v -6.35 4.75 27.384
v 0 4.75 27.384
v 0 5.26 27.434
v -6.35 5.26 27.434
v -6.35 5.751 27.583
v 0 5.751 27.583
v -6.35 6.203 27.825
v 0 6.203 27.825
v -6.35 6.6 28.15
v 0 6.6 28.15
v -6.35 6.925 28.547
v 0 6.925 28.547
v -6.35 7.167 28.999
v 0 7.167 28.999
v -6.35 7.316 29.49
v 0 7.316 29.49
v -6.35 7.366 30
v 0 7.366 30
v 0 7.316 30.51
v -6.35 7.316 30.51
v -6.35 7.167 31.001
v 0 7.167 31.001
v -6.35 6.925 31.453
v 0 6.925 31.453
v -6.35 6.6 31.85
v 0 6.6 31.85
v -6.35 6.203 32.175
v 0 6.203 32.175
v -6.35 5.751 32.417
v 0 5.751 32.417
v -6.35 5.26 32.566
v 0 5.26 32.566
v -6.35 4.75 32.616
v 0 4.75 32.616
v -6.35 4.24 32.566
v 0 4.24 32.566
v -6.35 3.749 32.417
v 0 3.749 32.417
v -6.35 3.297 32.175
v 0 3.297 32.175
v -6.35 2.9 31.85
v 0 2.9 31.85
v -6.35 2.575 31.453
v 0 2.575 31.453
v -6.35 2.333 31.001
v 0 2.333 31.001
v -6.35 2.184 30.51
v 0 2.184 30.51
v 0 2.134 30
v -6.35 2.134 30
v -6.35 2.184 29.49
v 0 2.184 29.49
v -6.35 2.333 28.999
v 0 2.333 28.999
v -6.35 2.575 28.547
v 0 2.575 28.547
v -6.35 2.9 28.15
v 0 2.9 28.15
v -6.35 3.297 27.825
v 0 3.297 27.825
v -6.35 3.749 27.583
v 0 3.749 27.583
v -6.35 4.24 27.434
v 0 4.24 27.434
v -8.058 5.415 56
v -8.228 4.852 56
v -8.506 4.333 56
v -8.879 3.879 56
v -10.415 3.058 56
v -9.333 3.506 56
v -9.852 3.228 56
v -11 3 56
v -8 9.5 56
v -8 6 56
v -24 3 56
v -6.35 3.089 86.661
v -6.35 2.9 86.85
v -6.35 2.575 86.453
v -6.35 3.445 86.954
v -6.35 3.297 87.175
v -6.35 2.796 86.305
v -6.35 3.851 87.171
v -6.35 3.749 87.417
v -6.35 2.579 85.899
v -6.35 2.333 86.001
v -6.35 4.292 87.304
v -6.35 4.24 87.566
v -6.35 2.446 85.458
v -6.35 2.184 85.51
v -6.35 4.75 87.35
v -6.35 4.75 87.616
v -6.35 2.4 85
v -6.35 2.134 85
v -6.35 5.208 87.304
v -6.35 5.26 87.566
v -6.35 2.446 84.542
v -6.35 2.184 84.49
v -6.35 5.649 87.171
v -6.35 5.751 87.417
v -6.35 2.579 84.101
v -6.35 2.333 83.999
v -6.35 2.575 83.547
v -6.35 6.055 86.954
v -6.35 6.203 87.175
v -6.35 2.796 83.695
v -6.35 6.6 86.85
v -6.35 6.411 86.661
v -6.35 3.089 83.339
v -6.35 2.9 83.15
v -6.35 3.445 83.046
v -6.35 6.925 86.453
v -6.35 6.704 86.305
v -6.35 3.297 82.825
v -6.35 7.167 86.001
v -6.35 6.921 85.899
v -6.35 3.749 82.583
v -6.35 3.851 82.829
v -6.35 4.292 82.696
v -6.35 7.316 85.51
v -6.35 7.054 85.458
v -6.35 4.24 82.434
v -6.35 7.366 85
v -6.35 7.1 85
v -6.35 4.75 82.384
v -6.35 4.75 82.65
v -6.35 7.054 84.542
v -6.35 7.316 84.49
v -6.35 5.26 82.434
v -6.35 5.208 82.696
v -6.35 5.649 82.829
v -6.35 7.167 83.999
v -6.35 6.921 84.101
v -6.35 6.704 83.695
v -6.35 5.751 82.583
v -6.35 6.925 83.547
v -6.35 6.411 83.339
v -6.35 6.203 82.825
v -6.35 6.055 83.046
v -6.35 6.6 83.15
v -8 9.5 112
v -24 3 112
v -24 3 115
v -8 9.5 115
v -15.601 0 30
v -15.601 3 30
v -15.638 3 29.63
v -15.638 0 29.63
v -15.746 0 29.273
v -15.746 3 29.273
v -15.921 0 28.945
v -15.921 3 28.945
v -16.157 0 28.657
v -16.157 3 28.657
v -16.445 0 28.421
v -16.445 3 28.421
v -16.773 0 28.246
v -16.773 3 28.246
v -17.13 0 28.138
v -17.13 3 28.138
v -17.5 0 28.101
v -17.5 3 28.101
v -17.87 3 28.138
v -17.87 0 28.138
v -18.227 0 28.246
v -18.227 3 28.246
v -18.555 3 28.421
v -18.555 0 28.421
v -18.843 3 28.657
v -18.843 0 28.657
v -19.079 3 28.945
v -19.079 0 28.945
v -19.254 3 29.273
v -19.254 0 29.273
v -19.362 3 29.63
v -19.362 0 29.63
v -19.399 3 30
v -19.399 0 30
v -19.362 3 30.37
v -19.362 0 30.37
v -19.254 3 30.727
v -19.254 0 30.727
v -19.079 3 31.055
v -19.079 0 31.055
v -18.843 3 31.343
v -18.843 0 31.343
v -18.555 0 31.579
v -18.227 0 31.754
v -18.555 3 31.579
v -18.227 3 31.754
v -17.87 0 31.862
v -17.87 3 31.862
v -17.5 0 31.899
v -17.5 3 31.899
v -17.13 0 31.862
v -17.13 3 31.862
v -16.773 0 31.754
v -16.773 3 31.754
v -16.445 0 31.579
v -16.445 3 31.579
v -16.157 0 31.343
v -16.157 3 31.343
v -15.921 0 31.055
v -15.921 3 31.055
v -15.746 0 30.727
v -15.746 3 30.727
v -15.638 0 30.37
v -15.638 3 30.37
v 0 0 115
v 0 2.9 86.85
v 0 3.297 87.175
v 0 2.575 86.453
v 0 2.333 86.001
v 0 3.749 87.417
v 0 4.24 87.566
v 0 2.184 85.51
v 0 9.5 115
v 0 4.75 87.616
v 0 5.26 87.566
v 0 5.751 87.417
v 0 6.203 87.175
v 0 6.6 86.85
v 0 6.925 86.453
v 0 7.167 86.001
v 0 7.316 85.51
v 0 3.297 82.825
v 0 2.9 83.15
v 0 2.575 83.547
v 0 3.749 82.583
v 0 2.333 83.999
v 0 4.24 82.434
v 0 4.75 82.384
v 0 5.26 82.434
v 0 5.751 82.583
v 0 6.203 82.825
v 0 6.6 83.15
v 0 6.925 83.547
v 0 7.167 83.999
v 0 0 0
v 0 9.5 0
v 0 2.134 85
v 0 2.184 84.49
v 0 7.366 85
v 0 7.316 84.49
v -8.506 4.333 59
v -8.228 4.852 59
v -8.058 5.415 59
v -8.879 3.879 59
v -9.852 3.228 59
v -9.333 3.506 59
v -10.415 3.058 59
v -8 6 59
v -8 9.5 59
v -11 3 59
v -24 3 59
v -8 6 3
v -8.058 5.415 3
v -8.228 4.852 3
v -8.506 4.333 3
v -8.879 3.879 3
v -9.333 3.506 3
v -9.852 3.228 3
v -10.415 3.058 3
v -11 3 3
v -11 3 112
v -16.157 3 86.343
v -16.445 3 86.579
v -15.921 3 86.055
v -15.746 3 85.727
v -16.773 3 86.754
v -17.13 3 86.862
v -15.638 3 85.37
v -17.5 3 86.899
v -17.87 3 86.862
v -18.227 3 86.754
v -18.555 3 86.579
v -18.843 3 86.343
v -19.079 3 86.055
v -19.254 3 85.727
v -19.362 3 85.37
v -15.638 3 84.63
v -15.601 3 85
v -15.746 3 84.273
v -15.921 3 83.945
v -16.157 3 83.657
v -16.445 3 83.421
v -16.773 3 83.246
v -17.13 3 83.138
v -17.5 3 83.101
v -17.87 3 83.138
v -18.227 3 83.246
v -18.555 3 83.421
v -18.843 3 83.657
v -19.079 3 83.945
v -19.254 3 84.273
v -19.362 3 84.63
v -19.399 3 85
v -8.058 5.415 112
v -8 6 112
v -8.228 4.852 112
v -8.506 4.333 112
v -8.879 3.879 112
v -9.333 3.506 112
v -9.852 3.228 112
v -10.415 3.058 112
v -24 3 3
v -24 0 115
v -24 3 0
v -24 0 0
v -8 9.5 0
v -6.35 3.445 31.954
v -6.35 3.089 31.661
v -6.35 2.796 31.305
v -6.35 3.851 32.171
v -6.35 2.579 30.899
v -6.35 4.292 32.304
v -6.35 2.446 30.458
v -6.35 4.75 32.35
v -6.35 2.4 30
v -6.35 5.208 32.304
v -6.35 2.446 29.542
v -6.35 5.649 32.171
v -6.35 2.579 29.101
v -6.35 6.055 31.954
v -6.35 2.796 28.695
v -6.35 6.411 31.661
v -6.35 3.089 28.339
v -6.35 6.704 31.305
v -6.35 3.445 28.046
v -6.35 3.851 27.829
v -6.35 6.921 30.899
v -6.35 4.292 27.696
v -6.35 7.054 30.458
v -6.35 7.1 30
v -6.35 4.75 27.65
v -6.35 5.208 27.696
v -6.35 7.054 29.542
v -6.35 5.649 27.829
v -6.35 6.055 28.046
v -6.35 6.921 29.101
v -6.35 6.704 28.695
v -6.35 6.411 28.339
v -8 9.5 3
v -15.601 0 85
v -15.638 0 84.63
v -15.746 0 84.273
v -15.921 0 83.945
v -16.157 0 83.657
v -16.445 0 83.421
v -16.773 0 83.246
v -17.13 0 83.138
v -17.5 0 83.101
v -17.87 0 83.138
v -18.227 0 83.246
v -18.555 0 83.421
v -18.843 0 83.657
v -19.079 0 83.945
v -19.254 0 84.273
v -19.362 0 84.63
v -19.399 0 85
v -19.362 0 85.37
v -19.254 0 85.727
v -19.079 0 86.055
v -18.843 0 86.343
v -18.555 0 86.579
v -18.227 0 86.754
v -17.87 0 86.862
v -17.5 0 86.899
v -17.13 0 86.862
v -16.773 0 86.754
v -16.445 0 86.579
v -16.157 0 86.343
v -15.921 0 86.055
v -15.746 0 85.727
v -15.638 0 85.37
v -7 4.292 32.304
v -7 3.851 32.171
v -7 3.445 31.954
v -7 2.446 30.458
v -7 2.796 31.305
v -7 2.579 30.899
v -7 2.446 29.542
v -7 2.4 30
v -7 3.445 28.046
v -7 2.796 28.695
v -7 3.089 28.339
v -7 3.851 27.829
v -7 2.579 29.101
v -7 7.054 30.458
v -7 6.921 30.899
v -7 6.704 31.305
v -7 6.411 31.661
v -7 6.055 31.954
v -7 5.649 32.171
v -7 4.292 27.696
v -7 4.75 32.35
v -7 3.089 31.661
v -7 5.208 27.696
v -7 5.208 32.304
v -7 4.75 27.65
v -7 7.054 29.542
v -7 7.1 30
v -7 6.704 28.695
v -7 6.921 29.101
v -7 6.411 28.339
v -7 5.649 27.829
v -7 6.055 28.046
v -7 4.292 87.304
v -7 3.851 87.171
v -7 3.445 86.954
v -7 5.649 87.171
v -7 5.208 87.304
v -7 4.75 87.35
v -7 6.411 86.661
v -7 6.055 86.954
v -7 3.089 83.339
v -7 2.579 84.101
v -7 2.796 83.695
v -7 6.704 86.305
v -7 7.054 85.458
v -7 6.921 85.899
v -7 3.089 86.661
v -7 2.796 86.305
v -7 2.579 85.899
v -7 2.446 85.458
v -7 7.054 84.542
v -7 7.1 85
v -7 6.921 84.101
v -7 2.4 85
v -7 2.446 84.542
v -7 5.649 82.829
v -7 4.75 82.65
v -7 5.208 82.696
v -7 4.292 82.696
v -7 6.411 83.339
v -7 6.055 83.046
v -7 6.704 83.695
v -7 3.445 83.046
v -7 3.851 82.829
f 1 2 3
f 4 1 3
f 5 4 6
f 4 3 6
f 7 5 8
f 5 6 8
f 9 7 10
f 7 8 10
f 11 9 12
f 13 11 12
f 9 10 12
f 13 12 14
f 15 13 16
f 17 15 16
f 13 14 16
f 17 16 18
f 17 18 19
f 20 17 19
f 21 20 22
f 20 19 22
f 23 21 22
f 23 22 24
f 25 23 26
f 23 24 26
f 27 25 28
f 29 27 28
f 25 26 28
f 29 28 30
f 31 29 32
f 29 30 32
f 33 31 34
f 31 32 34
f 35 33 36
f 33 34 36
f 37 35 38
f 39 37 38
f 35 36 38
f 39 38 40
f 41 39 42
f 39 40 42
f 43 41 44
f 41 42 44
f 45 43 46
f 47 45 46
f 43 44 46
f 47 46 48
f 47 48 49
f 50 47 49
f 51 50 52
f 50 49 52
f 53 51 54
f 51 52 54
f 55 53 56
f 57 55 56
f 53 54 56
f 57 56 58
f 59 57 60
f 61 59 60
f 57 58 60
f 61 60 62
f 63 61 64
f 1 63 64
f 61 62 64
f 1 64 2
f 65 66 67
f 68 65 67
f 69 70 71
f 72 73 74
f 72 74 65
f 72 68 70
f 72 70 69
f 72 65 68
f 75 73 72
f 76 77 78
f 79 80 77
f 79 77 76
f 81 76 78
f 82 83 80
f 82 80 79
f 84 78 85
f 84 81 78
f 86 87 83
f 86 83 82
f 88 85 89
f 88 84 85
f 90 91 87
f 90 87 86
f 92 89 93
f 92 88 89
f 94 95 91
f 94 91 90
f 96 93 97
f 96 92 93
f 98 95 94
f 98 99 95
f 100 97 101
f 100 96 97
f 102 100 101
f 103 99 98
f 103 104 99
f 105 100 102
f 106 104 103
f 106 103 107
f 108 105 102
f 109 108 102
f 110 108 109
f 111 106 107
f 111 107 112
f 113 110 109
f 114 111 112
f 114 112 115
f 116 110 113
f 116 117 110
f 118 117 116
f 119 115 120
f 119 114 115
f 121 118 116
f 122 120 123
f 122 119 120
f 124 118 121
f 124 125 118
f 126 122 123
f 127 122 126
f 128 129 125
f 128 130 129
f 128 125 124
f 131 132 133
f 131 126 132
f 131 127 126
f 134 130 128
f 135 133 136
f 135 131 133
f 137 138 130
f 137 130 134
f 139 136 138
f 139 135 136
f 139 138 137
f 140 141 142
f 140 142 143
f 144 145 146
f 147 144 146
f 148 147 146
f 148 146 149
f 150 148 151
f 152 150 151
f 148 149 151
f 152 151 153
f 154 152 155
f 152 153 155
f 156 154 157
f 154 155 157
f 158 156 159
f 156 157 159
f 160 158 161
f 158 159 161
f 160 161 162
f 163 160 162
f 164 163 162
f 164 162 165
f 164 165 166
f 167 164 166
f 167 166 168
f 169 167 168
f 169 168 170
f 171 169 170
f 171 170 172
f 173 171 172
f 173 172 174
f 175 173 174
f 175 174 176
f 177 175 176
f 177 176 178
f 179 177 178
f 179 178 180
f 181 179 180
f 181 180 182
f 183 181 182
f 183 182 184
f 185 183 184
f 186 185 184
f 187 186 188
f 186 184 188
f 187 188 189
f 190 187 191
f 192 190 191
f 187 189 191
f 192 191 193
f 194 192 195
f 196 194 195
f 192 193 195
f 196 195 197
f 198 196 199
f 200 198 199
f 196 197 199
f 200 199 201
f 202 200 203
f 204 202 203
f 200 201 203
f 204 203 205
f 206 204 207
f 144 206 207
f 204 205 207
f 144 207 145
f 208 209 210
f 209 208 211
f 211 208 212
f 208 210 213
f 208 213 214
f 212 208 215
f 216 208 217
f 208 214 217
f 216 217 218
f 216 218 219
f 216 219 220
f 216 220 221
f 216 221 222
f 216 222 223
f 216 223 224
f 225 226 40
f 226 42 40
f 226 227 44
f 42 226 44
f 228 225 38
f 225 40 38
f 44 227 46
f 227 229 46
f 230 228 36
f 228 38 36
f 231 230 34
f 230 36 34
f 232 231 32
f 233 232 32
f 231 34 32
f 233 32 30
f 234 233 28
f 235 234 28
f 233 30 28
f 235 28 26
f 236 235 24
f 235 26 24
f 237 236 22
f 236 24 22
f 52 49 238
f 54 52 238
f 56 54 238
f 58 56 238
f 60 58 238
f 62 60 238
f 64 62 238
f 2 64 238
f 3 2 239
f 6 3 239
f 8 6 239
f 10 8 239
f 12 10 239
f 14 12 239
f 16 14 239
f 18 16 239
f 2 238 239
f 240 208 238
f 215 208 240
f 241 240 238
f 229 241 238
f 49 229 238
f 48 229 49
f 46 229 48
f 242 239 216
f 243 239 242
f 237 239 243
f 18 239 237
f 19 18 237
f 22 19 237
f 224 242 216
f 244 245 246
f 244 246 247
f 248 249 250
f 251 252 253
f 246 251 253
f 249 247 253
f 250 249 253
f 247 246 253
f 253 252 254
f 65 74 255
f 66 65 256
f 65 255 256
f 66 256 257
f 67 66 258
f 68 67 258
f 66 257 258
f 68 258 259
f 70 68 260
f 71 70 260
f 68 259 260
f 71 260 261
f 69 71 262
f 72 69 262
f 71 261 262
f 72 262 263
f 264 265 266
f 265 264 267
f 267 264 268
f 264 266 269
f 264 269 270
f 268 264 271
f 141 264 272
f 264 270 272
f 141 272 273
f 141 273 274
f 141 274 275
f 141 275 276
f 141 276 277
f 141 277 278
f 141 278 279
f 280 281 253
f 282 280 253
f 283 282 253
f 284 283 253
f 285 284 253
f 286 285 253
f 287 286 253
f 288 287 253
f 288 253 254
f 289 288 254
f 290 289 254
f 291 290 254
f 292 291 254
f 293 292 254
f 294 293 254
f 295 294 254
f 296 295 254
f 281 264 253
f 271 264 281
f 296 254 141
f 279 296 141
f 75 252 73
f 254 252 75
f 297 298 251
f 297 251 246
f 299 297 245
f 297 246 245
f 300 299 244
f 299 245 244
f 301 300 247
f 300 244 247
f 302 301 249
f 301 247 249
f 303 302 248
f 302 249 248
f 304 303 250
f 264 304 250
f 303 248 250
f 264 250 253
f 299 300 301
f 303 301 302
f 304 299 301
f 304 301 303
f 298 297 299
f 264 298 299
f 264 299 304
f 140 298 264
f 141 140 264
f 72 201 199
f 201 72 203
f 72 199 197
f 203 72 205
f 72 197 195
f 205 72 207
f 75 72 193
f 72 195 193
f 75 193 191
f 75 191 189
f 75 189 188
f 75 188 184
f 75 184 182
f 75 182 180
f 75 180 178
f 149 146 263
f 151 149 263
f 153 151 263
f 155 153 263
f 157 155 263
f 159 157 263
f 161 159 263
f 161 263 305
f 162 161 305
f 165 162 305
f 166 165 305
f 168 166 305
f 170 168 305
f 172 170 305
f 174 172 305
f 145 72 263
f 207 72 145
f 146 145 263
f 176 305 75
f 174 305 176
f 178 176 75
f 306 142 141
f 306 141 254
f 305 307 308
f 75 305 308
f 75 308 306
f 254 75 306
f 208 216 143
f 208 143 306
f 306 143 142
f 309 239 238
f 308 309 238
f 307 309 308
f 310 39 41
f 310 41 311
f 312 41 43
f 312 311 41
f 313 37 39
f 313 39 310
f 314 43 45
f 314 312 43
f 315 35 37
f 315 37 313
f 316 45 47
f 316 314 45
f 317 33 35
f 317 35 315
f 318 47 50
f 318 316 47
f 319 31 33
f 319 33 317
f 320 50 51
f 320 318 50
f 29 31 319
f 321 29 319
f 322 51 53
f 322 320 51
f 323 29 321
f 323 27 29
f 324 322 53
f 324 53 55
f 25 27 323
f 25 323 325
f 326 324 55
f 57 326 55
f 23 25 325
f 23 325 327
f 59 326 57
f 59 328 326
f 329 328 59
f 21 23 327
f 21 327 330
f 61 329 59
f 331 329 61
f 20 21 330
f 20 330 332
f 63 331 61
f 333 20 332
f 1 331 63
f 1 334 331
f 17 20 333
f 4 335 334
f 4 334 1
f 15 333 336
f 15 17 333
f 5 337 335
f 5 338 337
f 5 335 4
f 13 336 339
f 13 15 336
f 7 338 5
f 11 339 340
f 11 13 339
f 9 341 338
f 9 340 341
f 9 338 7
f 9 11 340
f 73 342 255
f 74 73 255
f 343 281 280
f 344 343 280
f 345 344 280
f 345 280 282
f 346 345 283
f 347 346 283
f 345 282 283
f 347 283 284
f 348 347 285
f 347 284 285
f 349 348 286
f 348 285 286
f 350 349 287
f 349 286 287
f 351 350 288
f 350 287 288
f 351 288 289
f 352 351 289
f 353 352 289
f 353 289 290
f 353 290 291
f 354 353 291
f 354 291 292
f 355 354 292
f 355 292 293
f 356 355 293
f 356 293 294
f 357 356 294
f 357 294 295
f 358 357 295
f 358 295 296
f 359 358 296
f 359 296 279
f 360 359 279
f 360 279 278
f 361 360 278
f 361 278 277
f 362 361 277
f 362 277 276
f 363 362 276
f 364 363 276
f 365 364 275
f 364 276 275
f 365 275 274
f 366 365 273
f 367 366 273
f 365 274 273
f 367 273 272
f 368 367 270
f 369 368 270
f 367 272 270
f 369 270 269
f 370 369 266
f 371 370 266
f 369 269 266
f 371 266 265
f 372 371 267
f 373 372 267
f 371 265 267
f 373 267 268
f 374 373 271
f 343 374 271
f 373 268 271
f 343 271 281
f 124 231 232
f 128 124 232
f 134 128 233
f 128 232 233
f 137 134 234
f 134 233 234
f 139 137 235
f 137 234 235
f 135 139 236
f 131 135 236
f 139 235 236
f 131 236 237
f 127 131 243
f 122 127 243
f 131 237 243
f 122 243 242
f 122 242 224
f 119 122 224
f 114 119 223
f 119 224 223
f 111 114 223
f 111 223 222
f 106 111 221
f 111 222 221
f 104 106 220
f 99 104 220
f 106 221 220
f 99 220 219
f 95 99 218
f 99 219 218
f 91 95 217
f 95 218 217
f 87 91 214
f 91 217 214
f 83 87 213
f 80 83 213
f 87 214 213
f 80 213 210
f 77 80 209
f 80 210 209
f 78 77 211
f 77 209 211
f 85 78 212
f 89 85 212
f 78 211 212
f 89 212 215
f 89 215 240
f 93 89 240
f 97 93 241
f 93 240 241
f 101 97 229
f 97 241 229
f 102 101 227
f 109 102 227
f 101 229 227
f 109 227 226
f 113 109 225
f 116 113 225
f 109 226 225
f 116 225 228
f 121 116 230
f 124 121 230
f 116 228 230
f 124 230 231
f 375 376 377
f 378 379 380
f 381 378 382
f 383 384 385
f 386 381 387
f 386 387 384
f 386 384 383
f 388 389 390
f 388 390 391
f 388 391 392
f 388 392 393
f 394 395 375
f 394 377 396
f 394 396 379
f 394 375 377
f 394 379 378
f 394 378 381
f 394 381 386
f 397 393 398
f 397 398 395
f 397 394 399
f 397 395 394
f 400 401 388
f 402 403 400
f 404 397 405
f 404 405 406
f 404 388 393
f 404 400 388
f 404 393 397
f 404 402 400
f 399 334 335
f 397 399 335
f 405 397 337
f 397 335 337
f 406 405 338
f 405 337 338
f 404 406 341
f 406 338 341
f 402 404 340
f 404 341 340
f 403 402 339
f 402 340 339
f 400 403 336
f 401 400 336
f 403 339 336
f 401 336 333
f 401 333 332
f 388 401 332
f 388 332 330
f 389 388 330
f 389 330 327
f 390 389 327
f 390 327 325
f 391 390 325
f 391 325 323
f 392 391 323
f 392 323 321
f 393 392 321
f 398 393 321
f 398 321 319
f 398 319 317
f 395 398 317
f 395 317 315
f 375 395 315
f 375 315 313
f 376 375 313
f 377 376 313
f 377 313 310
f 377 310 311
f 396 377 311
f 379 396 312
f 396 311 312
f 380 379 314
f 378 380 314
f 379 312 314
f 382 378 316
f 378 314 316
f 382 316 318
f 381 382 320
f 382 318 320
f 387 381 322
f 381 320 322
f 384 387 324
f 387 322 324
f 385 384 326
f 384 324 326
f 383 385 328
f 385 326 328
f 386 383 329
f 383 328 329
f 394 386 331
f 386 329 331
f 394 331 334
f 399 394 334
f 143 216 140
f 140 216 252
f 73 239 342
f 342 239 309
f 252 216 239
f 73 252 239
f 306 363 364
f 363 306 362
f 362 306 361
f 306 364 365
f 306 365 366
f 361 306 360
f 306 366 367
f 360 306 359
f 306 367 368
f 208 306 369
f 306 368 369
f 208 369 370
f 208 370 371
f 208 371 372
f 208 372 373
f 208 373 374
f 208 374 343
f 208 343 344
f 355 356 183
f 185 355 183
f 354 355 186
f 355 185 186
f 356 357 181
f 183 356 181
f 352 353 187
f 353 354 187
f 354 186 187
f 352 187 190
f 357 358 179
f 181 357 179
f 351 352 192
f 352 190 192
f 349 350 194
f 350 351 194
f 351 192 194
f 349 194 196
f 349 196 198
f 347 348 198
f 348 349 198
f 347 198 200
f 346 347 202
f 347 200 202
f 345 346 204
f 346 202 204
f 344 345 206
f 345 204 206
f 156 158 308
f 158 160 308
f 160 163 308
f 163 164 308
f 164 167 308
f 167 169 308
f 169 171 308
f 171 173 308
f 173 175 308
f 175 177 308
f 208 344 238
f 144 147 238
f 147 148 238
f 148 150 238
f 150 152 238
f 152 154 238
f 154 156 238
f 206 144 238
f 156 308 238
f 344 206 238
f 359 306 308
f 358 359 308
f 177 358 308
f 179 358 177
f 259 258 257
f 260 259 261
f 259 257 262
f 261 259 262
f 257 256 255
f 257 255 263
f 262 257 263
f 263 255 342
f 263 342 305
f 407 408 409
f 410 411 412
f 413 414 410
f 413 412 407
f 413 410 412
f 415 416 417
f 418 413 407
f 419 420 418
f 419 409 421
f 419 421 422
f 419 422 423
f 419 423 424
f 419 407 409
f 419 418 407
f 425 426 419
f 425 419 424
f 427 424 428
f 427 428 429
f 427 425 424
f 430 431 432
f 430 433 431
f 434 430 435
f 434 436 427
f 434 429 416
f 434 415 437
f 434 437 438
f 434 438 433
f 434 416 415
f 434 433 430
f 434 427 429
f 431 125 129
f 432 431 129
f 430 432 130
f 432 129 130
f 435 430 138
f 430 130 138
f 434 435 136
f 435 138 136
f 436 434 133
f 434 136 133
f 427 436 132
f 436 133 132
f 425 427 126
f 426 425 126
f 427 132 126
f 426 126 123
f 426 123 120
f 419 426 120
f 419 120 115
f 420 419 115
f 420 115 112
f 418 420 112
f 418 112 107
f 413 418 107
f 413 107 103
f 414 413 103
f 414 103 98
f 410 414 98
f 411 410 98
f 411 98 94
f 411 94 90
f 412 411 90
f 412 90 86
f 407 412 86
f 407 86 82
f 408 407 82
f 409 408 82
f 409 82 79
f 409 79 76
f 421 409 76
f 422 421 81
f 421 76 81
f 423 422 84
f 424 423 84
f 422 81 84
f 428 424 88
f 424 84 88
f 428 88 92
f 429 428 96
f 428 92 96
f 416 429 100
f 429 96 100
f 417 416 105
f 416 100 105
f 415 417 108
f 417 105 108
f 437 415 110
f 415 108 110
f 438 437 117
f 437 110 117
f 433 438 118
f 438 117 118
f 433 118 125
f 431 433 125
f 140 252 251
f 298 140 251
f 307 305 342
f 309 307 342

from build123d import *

# Parameters (mm, degrees)
BOSS_EXTRUDE1_DEPTH   = 115
RIB3_REACH            = 65.028
SKETCH4_WALL_W        = 145.325459352
SKETCH4_WALL_H        = 3
RIB4_START            = -3
RIB4_DEPTH            = 3
F_6_CLEARANCE_HOLE1_D = 3.7973
SKETCH6_R             = 2.3495
CUT_EXTRUDE1_DEPTH    = 7
SKETCH12_R            = 2.6162
CUT_EXTRUDE2_DEPTH    = 6.35


# Read off the part's stored shape, not the designer's step: Rib4
with BuildPart() as part:
    # Sketch1 → Boss-Extrude1 (new body)
    with BuildSketch(Plane.XY):
        with BuildLine():
            Line((0, 0), (0, 9.5))
            Line((0, 9.5), (-8, 9.5))
            Line((-8, 9.5), (-8, 6))
            ThreePointArc((-8, 6), (-8.878679656, 3.878679656), (-11, 3))
            Line((-11, 3), (-24, 3))
            Line((-24, 3), (-24, 0))
            Line((-24, 0), (0, 0))
        make_face()
    extrude(amount=BOSS_EXTRUDE1_DEPTH)

    # Sketch4 wall → Rib3 (add, up to next)
    with BuildSketch(Plane(origin=(-16, 6.25, 57.5), x_dir=(-0.926466577122, -0.376377046956, 0), z_dir=(-0.376377046956, 0.926466577122, 0)), mode=Mode.PRIVATE) as rib3_sk1:
        Rectangle(SKETCH4_WALL_W, SKETCH4_WALL_H)
    rib3_tool1 = extrude(rib3_sk1.sketch, amount=-RIB3_REACH, mode=Mode.PRIVATE) - part.part
    add(rib3_tool1.solids().sort_by_distance((-16, 6.25, 57.5))[0])

    # Rib4 outline → Rib4 (add)
    with BuildSketch(Plane(origin=(0, 0, 0), x_dir=(-1, 0, 0), z_dir=(0, 0, -1)).offset(RIB4_START)):
        with BuildLine():
            Line((24, 3), (8, 9.5))
            Line((8, 9.5), (8, 6))
            ThreePointArc((8, 6), (8.878679656, 3.878679656), (11, 3))
            Line((11, 3), (24, 3))
        make_face()
    rib4 = extrude(amount=RIB4_DEPTH)

    # Mirror1: Rib4 across plane
    add(rib4.mirror(Plane(origin=(0, 0, 57.5), x_dir=(1, 0, 0), z_dir=(0, 0, -1))))

    # #6 Clearance Hole1 (through all)
    with Locations(Plane(origin=(0, 0, 0), x_dir=(-1, 0, 0), z_dir=(0, -1, 0))):
        with Locations((17.5, -30), (17.5, -85)):
            Hole(F_6_CLEARANCE_HOLE1_D / 2)

    # Sketch6 → Cut-Extrude1 (cut)
    with BuildSketch(Plane(origin=(0, 0, 0), x_dir=(0, 0, -1), z_dir=(1, 0, 0))):
        with Locations((-85, 4.75)):
            Circle(SKETCH6_R)
        with Locations((-30, 4.75)):
            Circle(SKETCH6_R)
    extrude(amount=-CUT_EXTRUDE1_DEPTH, mode=Mode.SUBTRACT)

    # Sketch12 → Cut-Extrude2 (cut)
    with BuildSketch(Plane(origin=(0, 0, 0), x_dir=(0, 0, -1), z_dir=(1, 0, 0))):
        with Locations((-85, 4.75)):
            Circle(SKETCH12_R)
        with Locations((-30, 4.75)):
            Circle(SKETCH12_R)
    extrude(amount=-CUT_EXTRUDE2_DEPTH, mode=Mode.SUBTRACT)


solid = part.part
